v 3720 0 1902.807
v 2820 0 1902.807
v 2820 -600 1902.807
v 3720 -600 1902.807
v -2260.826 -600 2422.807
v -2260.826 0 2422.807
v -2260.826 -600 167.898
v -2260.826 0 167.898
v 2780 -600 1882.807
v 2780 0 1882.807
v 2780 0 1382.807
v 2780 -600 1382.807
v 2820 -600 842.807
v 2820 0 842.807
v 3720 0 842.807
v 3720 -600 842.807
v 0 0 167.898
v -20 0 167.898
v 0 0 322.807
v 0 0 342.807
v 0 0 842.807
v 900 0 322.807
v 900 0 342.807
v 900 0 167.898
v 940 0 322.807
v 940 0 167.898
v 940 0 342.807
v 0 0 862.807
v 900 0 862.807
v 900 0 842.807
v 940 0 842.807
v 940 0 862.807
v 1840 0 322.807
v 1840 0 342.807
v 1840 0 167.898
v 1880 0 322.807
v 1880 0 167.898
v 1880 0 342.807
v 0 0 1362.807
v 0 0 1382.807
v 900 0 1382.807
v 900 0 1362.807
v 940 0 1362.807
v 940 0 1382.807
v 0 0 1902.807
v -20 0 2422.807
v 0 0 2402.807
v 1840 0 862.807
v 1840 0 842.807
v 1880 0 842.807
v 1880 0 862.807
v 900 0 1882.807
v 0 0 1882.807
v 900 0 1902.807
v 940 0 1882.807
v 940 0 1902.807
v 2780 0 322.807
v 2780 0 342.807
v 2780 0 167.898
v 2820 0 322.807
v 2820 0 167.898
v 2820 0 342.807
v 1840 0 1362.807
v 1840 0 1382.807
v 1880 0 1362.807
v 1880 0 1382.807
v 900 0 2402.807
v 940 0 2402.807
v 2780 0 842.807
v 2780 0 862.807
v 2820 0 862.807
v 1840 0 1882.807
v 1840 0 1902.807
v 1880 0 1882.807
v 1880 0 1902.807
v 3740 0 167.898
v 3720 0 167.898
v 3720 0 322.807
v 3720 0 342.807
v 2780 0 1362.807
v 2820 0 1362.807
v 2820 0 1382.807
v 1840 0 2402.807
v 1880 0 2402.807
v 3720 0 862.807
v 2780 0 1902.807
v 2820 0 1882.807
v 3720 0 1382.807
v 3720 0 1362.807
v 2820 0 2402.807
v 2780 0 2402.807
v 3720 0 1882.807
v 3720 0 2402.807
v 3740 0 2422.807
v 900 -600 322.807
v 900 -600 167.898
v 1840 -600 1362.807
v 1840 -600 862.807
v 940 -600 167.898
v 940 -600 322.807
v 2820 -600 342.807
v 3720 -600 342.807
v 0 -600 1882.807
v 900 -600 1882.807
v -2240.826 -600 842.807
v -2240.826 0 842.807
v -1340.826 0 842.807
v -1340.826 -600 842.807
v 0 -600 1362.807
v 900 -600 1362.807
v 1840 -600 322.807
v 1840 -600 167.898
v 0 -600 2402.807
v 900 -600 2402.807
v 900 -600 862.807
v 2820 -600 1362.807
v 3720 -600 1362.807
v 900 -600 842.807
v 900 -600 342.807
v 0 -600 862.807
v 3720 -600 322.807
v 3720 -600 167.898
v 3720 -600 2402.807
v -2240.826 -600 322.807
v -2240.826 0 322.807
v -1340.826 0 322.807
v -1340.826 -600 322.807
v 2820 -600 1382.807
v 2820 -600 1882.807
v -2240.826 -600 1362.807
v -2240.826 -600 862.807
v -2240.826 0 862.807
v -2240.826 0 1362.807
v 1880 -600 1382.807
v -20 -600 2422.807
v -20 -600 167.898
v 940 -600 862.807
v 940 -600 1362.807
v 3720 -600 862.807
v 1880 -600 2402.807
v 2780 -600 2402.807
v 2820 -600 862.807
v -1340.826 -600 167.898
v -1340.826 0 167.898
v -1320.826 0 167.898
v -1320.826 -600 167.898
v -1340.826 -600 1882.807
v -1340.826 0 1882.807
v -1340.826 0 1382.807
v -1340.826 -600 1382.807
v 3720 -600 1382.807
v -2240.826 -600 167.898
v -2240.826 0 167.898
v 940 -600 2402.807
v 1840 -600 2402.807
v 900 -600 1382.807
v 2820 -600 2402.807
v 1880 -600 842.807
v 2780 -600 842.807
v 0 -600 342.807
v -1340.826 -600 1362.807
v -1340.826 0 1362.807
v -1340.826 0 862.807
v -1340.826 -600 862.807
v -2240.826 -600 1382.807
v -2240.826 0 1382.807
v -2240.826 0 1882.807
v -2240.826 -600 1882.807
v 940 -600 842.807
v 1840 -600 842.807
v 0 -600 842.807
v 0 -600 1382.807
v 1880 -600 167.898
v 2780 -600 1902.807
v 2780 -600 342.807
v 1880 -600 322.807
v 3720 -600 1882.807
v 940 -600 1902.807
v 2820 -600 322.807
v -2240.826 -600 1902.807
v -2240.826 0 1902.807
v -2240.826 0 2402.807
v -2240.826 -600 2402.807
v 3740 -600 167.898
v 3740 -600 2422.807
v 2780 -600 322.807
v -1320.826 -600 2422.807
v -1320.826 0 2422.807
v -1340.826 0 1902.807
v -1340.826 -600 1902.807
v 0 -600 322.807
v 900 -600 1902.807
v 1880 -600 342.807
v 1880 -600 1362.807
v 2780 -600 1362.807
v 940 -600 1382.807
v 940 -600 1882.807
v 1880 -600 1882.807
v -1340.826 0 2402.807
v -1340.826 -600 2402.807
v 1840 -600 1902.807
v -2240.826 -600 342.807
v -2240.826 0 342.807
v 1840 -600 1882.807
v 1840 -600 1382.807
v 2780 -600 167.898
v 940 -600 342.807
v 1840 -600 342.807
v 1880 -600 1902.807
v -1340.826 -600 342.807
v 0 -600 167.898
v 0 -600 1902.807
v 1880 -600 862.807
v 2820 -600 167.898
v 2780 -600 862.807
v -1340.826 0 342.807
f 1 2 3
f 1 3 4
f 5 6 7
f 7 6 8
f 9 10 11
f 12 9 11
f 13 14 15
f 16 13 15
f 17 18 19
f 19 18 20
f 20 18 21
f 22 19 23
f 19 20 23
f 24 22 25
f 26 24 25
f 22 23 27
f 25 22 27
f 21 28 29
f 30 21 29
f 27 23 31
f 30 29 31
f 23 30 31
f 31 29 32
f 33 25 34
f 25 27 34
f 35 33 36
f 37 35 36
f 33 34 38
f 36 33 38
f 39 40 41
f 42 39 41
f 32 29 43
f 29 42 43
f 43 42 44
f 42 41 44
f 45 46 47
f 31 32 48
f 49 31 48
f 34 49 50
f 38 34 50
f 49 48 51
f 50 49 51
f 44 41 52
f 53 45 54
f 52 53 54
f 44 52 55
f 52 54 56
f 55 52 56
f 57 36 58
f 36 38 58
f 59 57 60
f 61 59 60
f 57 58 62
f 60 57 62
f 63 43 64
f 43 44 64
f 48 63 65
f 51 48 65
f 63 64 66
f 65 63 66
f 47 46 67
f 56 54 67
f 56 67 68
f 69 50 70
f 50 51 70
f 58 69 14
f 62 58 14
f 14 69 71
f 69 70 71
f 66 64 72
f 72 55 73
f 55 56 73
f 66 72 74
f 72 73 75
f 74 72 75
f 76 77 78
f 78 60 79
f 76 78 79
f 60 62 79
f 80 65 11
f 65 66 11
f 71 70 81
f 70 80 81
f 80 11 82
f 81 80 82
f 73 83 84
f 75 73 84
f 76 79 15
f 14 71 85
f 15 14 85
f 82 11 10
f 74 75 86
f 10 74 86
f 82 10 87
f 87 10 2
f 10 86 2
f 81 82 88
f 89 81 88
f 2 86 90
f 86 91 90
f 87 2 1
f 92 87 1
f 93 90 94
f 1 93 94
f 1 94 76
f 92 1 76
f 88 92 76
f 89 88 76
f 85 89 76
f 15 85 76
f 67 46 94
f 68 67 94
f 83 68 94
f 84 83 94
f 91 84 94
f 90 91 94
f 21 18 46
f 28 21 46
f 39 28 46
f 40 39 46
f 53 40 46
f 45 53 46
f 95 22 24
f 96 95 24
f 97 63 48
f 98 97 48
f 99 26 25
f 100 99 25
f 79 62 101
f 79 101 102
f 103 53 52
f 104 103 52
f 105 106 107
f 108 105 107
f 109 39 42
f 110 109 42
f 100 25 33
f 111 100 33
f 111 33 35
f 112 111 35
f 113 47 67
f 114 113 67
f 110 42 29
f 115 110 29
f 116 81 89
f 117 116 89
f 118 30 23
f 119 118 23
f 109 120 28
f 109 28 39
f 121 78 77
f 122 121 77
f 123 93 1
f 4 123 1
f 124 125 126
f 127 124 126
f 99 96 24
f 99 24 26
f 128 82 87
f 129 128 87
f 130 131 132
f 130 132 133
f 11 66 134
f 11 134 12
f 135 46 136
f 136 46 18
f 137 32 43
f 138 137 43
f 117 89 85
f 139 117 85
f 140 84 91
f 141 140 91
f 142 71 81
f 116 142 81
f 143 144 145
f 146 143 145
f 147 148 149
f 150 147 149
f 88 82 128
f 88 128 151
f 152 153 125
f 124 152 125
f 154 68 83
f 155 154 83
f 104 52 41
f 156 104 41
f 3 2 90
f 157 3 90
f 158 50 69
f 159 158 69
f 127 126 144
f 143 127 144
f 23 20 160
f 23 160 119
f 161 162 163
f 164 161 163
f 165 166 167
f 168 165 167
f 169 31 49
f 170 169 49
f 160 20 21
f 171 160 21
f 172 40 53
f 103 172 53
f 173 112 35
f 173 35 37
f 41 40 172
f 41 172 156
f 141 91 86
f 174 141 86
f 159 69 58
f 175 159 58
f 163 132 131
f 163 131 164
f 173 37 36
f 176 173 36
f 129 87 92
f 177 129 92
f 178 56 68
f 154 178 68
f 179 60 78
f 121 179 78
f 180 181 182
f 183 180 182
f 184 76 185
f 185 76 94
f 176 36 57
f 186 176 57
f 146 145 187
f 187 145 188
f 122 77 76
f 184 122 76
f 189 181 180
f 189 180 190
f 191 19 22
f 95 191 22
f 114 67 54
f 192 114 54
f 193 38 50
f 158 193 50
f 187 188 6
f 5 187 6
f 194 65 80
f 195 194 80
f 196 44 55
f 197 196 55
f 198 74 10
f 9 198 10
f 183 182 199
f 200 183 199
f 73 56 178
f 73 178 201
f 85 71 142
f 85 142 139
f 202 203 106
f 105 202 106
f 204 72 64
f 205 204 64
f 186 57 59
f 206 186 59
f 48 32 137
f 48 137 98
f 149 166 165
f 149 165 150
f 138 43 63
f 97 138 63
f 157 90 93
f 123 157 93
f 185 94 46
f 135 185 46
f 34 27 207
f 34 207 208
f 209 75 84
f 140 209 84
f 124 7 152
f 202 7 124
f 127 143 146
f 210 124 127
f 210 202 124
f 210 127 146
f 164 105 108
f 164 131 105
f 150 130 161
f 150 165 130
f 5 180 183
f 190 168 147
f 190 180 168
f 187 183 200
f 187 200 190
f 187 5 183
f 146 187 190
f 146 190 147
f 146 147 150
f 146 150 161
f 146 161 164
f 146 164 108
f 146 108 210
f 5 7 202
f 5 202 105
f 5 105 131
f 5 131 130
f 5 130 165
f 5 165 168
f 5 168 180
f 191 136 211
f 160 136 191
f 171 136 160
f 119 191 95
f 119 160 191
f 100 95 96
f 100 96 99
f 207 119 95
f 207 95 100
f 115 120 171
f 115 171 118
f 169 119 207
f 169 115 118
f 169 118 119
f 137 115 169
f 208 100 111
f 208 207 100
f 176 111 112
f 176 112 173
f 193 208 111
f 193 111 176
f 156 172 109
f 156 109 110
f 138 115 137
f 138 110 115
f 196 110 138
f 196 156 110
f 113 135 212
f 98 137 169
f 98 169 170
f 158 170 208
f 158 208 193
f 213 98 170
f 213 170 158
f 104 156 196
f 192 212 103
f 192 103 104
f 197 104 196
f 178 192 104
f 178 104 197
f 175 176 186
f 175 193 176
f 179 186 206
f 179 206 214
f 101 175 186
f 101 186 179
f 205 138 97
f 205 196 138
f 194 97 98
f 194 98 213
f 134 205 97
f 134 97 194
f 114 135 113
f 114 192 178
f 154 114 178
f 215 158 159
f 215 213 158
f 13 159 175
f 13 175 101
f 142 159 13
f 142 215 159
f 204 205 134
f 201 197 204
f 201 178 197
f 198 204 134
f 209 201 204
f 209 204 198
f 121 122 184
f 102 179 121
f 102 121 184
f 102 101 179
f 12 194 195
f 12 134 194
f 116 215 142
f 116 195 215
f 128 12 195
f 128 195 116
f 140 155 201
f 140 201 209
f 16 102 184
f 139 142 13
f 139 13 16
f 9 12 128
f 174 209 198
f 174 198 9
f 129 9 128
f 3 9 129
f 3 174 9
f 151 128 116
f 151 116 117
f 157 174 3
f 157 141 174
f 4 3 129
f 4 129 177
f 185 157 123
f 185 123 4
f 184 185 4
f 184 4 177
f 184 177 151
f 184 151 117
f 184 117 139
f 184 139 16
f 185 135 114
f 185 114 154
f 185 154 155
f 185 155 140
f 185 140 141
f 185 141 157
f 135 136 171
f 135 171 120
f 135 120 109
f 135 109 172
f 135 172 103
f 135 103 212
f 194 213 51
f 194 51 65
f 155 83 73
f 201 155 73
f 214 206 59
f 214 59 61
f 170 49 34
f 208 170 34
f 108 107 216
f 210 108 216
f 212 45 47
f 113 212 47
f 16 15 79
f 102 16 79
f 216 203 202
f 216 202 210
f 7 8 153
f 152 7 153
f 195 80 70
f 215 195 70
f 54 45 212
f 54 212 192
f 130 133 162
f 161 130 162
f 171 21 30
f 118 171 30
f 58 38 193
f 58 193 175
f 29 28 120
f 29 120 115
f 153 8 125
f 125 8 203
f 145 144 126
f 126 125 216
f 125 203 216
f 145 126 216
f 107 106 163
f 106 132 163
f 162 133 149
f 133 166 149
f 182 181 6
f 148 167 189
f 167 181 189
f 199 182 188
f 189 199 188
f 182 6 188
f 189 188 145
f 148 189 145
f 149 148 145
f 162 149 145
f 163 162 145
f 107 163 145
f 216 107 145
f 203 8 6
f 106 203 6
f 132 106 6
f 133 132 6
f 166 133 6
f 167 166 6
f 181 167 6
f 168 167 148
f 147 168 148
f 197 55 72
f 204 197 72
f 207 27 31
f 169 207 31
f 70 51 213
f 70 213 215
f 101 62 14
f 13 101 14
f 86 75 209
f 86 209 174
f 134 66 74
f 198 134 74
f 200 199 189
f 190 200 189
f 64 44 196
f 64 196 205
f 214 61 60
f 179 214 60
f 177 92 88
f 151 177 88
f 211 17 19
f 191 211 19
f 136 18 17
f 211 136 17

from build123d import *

# Parameters (mm, degrees)
F0_W     = 900
F0_H     = 20
F1_DEPTH = 600


with BuildPart() as f1:
    # F0 (on Front) → F1 (new body)
    with BuildSketch(Plane.XZ):
        Polygon((0, 342.806876), (0, 842.806876), (0, 862.806876), (0, 1362.806876), (0, 1382.806876), (0, 1882.806876), (0, 1902.806876), (0, 2402.806876), (-20, 2402.806876), (-20, 167.898178), (0, 167.898178), (0, 322.806876), align=None)
        Polygon((2800, 167.898178), (2800, 2402.806876), (2780, 2402.806876), (2780, 1902.806876), (2780, 1882.806876), (2780, 1382.806876), (2780, 1362.806876), (2780, 862.806876), (2780, 842.806876), (2780, 342.806876), (2780, 322.806876), (2780, 167.898178), align=None)
        Polygon((1880, 2402.806876), (1860, 2402.806876), (1860, 167.898178), (1880, 167.898178), (1880, 322.806876), (1880, 342.806876), (1880, 842.806876), (1880, 862.806876), (1880, 1362.806876), (1880, 1382.806876), (1880, 1882.806876), (1880, 1902.806876), align=None)
        with Locations((3270, 852.806876)):
            Rectangle(F0_W, F0_H)
        Polygon((900, 862.806876), (900, 842.806876), (900, 342.806876), (900, 322.806876), (900, 167.898178), (920, 167.898178), (920, 2402.806876), (900, 2402.806876), (900, 1902.806876), (900, 1882.806876), (900, 1382.806876), (900, 1362.806876), align=None)
        with Locations((1390, 852.806876)):
            Rectangle(F0_W, F0_H)
        with Locations((2330, 1372.806876)):
            Rectangle(F0_W, F0_H)
        with Locations((450, 1372.806876)):
            Rectangle(F0_W, F0_H)
        with Locations((450, 852.806876)):
            Rectangle(F0_W, F0_H)
        with Locations((3270, 1372.806876)):
            Rectangle(F0_W, F0_H)
        with Locations((2330, 852.806876)):
            Rectangle(F0_W, F0_H)
        with Locations((1390, 1372.806876)):
            Rectangle(F0_W, F0_H)
        Polygon((2800, 2422.806876), (1860, 2422.806876), (1860, 2402.806876), (1880, 2402.806876), (2780, 2402.806876), (2800, 2402.806876), align=None)
        Polygon((3740, 2422.806876), (2800, 2422.806876), (2800, 2402.806876), (2820, 2402.806876), (3720, 2402.806876), (3740, 2402.806876), align=None)
        Polygon((920, 2402.806876), (920, 167.898178), (940, 167.898178), (940, 322.806876), (940, 342.806876), (940, 842.806876), (940, 862.806876), (940, 1362.806876), (940, 1382.806876), (940, 1882.806876), (940, 1902.806876), (940, 2402.806876), align=None)
        Polygon((2820, 2402.806876), (2800, 2402.806876), (2800, 167.898178), (2820, 167.898178), (2820, 322.806876), (2820, 342.806876), (2820, 842.806876), (2820, 862.806876), (2820, 1362.806876), (2820, 1382.806876), (2820, 1882.806876), (2820, 1902.806876), align=None)
        Polygon((3740, 167.898178), (3740, 2402.806876), (3720, 2402.806876), (3720, 1902.806876), (3720, 1882.806876), (3720, 1382.806876), (3720, 1362.806876), (3720, 862.806876), (3720, 842.806876), (3720, 342.806876), (3720, 322.806876), (3720, 167.898178), align=None)
        Polygon((-20, 2422.806876), (-20, 2402.806876), (0, 2402.806876), (900, 2402.806876), (920, 2402.806876), (920, 2422.806876), align=None)
        Polygon((920, 2422.806876), (920, 2402.806876), (940, 2402.806876), (1840, 2402.806876), (1860, 2402.806876), (1860, 2422.806876), align=None)
        with Locations((1390, 332.806876)):
            Rectangle(F0_W, F0_H)
        with Locations((3270, 332.806876)):
            Rectangle(F0_W, F0_H)
        Polygon((1860, 2402.806876), (1840, 2402.806876), (1840, 1902.806876), (1840, 1882.806876), (1840, 1382.806876), (1840, 1362.806876), (1840, 862.806876), (1840, 842.806876), (1840, 342.806876), (1840, 322.806876), (1840, 167.898178), (1860, 167.898178), align=None)
        with Locations((2330, 332.806876)):
            Rectangle(F0_W, F0_H)
        with Locations((450, 332.806876)):
            Rectangle(F0_W, F0_H)
        with Locations((450, 1892.806876)):
            Rectangle(F0_W, F0_H)
        with Locations((2330, 1892.806876)):
            Rectangle(F0_W, F0_H)
        with Locations((3270, 1892.806876)):
            Rectangle(F0_W, F0_H)
        with Locations((1390, 1892.806876)):
            Rectangle(F0_W, F0_H)
        Polygon((-2240.826035, 862.806876), (-2240.826035, 1362.806876), (-2240.826035, 1382.806876), (-2240.826035, 1882.806876), (-2240.826035, 1902.806876), (-2240.826035, 2402.806876), (-1340.826035, 2402.806876), (-1340.826035, 1902.806876), (-1340.826035, 1882.806876), (-1340.826035, 1382.806876), (-1340.826035, 1362.806876), (-1340.826035, 862.806876), (-1340.826035, 842.806876), (-1340.826035, 342.806876), (-1340.826035, 322.806876), (-1340.826035, 167.898178), (-1320.826035, 167.898178), (-1320.826035, 2402.806876), (-1320.826035, 2422.806876), (-2260.826035, 2422.806876), (-2260.826035, 2402.806876), (-2260.826035, 167.898178), (-2240.826035, 167.898178), (-2240.826035, 322.806876), (-2240.826035, 342.806876), (-2240.826035, 842.806876), align=None)
        with Locations((-1790.826035, 332.806876)):
            Rectangle(F0_W, F0_H)
        with Locations((-1790.826035, 852.806876)):
            Rectangle(F0_W, F0_H)
        with Locations((-1790.826035, 1372.806876)):
            Rectangle(F0_W, F0_H)
        with Locations((-1790.826035, 1892.806876)):
            Rectangle(F0_W, F0_H)
    extrude(amount=F1_DEPTH)


solid = f1.part
